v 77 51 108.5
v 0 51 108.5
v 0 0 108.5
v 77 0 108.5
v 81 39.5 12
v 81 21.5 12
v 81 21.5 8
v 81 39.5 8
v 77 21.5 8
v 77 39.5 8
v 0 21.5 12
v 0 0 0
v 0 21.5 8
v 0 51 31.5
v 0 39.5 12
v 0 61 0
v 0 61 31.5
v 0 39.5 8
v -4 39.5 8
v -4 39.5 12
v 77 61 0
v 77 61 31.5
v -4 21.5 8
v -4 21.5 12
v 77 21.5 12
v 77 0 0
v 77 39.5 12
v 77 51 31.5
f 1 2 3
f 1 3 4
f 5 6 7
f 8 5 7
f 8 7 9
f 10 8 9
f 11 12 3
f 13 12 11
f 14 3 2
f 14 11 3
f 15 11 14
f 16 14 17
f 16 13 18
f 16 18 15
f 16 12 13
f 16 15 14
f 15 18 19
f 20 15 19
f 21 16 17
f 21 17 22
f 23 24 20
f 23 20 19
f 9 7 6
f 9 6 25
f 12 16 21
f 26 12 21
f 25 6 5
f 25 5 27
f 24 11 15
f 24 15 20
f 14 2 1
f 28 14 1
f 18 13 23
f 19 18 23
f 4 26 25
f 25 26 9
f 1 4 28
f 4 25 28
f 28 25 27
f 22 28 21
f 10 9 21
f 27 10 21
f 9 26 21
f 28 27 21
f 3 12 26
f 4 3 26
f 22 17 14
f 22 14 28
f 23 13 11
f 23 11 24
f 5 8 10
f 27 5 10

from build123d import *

# Parameters (mm, degrees)
SKETCH_1_W          = 77
SKETCH_1_H          = 61
EXTRUDE_1_DEPTH     = 108.5
SKETCH_2_W          = 77
SKETCH_2_H          = 77
CUT_EXTRUDE_1_DEPTH = 10
SKETCH_3_W          = 85
SKETCH_3_H          = 4
EXTRUDE_2_DEPTH     = 18


with BuildPart() as part:
    # 草图1 → 凸台-拉伸1 (new body)
    with BuildSketch(Plane.XY):
        with Locations((38.5, 30.5)):
            Rectangle(SKETCH_1_W, SKETCH_1_H)
    extrude(amount=EXTRUDE_1_DEPTH)

    # 草图2 → 切除-拉伸1 (cut)
    with BuildSketch(Plane(origin=(0, 61, 0), x_dir=(1, 0, 0), z_dir=(0, 1, 0))):
        with Locations((38.5, -70)):
            Rectangle(SKETCH_2_W, SKETCH_2_H)
    extrude(amount=-CUT_EXTRUDE_1_DEPTH, mode=Mode.SUBTRACT)

    # 草图3 → 凸台-拉伸2 (add)
    with BuildSketch(Plane(origin=(0, 21.5, 0), x_dir=(-1, 0, 0), z_dir=(0, -1, 0))):
        with Locations((-38.5, -10)):
            Rectangle(SKETCH_3_W, SKETCH_3_H)
    extrude(amount=-EXTRUDE_2_DEPTH)


solid = part.part
